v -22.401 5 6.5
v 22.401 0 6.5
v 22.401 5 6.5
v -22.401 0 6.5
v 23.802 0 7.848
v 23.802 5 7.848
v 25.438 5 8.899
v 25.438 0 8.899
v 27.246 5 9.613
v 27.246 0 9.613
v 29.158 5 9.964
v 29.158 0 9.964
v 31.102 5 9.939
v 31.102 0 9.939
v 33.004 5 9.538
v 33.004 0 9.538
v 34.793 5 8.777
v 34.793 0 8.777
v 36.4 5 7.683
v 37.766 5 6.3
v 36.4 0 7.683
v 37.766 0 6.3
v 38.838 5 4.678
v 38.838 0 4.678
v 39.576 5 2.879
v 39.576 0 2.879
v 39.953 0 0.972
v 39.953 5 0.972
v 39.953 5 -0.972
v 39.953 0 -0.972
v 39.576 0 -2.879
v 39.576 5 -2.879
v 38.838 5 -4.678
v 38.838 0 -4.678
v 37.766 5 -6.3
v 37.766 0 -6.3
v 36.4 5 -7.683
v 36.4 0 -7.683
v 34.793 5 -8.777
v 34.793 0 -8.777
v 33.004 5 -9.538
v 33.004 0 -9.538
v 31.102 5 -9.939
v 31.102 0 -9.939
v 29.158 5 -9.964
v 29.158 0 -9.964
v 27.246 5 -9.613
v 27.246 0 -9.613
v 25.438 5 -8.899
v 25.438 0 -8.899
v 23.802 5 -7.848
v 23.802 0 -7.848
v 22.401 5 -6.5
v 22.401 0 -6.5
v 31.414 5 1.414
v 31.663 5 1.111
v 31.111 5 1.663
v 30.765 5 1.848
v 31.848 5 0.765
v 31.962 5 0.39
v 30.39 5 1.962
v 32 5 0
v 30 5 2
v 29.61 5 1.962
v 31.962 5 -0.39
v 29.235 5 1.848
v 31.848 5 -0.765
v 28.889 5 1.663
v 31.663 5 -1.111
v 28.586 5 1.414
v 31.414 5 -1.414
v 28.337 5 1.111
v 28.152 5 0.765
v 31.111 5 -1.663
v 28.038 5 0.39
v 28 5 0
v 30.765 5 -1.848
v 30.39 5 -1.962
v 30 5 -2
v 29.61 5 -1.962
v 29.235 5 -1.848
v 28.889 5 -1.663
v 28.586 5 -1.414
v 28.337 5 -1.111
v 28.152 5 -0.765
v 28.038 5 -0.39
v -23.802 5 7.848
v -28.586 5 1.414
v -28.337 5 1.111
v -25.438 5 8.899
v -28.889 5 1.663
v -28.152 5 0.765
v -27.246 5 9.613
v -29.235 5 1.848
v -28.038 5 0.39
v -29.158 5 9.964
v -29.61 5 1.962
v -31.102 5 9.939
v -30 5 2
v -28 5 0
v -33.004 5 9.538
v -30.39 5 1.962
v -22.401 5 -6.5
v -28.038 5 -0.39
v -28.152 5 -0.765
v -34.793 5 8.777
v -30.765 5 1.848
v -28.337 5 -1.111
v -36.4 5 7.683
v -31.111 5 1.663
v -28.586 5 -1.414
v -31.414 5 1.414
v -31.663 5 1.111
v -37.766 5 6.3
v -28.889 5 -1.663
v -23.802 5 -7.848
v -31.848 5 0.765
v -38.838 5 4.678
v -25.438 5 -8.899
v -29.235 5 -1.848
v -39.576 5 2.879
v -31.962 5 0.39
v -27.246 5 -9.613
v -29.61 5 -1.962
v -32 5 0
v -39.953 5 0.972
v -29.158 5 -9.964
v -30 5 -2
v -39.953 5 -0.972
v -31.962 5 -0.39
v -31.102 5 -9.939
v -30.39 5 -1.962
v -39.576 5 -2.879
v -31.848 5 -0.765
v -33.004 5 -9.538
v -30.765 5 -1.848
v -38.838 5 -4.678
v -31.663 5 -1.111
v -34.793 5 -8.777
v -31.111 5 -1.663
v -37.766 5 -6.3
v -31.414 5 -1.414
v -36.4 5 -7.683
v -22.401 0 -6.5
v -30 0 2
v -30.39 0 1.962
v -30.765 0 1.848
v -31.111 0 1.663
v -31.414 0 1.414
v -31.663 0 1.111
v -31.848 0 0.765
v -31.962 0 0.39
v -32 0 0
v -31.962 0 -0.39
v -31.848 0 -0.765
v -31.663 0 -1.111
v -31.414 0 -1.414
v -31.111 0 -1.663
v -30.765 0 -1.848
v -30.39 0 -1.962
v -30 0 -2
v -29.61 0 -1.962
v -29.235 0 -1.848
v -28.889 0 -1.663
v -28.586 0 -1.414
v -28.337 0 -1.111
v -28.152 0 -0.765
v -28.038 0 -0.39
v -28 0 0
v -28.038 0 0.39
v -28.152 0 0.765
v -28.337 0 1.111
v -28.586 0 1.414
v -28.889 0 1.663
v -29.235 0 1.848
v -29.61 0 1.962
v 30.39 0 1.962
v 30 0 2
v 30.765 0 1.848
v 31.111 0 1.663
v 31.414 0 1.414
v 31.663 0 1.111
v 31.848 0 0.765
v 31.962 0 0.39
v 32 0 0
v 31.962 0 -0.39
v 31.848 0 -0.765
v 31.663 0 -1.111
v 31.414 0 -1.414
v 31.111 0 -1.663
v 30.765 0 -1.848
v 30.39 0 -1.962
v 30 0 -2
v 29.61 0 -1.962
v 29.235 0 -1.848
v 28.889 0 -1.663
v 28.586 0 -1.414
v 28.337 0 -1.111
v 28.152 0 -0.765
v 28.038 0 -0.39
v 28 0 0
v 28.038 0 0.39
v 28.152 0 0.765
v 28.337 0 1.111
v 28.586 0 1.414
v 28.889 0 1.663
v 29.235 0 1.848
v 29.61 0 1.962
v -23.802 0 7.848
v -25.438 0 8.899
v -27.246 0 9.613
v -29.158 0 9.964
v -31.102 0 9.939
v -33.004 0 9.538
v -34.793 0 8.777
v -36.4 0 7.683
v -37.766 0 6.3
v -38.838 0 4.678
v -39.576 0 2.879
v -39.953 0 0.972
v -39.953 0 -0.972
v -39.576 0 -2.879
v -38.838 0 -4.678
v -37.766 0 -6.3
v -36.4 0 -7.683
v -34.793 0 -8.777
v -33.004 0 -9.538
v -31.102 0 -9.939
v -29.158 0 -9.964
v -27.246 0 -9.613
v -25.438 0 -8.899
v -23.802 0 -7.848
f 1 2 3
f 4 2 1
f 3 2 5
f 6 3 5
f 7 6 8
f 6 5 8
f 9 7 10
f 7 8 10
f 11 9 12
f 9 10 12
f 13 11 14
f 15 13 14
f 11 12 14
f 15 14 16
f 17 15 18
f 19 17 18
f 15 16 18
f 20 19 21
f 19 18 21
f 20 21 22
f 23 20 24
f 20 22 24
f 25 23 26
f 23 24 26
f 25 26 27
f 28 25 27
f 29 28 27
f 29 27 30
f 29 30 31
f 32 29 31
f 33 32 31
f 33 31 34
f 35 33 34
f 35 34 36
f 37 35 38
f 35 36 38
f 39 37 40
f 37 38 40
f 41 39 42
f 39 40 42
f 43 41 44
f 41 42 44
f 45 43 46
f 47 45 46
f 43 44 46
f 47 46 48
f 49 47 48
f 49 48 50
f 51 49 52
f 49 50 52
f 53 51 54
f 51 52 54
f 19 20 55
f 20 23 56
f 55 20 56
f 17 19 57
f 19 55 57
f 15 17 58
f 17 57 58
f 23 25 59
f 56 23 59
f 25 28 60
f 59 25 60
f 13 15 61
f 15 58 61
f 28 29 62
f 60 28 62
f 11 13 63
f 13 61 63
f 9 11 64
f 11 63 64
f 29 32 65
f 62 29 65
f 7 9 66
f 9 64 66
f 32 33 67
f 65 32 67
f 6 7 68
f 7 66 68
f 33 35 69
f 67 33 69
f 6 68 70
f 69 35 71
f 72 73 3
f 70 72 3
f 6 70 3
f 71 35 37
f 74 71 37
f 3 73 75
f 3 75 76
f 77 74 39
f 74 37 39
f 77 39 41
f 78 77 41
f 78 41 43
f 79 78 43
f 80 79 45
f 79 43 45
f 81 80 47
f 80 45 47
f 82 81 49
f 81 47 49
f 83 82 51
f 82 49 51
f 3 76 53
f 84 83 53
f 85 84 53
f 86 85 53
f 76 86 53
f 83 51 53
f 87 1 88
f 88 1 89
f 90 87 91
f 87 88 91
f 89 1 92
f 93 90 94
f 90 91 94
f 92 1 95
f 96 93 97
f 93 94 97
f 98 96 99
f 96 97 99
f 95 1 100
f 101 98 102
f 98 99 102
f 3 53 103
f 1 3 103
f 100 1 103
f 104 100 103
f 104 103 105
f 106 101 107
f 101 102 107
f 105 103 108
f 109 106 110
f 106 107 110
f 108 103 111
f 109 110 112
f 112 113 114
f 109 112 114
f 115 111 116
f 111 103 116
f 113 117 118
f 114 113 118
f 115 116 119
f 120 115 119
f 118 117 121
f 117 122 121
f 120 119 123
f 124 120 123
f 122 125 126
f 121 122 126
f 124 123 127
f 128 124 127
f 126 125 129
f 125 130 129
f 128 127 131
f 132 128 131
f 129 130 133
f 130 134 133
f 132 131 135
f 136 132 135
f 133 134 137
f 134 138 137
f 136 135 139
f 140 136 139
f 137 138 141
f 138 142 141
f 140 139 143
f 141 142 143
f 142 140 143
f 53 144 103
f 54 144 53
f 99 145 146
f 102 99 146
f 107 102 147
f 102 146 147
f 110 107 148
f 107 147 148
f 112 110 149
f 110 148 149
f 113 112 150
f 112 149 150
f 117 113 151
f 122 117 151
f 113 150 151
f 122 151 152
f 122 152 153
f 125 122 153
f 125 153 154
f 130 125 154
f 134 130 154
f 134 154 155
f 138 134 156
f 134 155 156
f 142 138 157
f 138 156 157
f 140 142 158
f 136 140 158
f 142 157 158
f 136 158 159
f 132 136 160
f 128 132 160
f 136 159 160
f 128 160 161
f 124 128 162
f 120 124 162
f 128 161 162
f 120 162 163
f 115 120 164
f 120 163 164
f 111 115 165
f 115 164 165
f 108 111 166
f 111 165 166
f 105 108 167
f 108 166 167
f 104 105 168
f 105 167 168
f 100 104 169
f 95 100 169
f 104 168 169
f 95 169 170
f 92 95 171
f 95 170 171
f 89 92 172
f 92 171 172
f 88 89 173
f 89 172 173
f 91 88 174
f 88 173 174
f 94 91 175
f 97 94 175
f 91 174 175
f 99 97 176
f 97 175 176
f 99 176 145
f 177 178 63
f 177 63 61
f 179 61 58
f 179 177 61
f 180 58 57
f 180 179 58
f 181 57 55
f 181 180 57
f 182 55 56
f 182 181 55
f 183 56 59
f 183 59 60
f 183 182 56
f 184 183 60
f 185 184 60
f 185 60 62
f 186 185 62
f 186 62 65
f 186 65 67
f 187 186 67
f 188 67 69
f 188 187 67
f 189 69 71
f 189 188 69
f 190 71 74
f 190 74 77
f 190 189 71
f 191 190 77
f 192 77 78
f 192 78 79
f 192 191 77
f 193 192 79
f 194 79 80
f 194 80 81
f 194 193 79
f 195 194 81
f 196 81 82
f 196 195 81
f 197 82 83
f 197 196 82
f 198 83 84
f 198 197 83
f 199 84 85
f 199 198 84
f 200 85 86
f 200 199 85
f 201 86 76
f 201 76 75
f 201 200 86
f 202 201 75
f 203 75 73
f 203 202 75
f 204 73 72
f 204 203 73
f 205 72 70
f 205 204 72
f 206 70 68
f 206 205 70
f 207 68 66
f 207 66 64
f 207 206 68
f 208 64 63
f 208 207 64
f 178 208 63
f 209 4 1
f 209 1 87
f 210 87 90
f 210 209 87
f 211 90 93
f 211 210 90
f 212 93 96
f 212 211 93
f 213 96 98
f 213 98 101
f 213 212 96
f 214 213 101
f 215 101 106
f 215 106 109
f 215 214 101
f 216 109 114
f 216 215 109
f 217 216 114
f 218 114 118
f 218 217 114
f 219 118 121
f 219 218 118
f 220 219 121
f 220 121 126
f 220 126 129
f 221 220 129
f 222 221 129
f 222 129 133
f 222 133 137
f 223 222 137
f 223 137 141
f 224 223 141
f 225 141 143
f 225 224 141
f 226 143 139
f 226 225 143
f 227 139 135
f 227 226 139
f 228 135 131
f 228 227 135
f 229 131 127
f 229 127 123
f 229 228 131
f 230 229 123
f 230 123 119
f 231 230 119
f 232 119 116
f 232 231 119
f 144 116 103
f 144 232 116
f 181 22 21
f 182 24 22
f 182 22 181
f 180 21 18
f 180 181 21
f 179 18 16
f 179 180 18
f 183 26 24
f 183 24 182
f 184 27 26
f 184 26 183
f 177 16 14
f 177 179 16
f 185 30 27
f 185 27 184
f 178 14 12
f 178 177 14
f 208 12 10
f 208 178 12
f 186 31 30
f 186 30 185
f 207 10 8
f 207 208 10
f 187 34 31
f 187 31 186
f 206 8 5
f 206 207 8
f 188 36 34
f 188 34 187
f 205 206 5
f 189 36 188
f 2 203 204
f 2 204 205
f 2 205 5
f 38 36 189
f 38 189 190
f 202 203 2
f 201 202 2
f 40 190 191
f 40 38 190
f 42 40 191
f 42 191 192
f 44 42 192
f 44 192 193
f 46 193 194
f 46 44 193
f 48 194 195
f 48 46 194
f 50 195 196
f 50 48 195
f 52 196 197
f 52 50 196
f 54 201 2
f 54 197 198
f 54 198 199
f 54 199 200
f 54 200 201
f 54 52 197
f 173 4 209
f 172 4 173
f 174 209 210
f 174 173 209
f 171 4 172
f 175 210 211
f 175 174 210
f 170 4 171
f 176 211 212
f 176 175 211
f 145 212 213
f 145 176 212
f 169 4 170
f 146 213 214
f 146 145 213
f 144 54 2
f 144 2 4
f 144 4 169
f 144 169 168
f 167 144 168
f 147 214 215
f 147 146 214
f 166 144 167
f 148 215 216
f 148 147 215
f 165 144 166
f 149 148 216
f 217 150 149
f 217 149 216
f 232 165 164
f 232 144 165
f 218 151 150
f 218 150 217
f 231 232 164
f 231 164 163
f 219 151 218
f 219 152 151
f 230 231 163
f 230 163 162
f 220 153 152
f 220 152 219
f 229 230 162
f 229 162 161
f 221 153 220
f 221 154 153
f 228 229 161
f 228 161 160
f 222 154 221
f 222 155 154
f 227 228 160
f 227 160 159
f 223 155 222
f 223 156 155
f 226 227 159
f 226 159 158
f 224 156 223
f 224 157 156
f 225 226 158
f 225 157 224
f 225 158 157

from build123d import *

# Parameters (mm, degrees)
SKIZZE1_R                       = 2
AUFSATZ_LINEAR_AUSTRAGEN1_DEPTH = 5


with BuildPart() as part:
    # Skizze1 → Aufsatz-Linear austragen1 (new body)
    with BuildSketch(Plane(origin=(0, 0, 0), x_dir=(1, 0, 0), z_dir=(0, 1, 0))):
        with BuildLine():
            Line((22.400657923, 6.5), (0, 6.5))
            Line((0, 6.5), (0, -6.5))
            Line((0, -6.5), (22.400657923, -6.5))
            ThreePointArc((22.400657923, -6.5), (40, 0), (22.400657923, 6.5))
        make_face()
        with Locations(Location((30, 0, 0), (0, 0, 270))):
            Circle(SKIZZE1_R, mode=Mode.SUBTRACT)
    aufsatz_linear_austragen1 = extrude(amount=AUFSATZ_LINEAR_AUSTRAGEN1_DEPTH)

    # Spiegeln1: Aufsatz-Linear austragen1 across plane
    add(aufsatz_linear_austragen1.mirror(Plane(origin=(0, 0, 0), x_dir=(0, 0, 1), z_dir=(1, 0, 0))))


solid = part.part
